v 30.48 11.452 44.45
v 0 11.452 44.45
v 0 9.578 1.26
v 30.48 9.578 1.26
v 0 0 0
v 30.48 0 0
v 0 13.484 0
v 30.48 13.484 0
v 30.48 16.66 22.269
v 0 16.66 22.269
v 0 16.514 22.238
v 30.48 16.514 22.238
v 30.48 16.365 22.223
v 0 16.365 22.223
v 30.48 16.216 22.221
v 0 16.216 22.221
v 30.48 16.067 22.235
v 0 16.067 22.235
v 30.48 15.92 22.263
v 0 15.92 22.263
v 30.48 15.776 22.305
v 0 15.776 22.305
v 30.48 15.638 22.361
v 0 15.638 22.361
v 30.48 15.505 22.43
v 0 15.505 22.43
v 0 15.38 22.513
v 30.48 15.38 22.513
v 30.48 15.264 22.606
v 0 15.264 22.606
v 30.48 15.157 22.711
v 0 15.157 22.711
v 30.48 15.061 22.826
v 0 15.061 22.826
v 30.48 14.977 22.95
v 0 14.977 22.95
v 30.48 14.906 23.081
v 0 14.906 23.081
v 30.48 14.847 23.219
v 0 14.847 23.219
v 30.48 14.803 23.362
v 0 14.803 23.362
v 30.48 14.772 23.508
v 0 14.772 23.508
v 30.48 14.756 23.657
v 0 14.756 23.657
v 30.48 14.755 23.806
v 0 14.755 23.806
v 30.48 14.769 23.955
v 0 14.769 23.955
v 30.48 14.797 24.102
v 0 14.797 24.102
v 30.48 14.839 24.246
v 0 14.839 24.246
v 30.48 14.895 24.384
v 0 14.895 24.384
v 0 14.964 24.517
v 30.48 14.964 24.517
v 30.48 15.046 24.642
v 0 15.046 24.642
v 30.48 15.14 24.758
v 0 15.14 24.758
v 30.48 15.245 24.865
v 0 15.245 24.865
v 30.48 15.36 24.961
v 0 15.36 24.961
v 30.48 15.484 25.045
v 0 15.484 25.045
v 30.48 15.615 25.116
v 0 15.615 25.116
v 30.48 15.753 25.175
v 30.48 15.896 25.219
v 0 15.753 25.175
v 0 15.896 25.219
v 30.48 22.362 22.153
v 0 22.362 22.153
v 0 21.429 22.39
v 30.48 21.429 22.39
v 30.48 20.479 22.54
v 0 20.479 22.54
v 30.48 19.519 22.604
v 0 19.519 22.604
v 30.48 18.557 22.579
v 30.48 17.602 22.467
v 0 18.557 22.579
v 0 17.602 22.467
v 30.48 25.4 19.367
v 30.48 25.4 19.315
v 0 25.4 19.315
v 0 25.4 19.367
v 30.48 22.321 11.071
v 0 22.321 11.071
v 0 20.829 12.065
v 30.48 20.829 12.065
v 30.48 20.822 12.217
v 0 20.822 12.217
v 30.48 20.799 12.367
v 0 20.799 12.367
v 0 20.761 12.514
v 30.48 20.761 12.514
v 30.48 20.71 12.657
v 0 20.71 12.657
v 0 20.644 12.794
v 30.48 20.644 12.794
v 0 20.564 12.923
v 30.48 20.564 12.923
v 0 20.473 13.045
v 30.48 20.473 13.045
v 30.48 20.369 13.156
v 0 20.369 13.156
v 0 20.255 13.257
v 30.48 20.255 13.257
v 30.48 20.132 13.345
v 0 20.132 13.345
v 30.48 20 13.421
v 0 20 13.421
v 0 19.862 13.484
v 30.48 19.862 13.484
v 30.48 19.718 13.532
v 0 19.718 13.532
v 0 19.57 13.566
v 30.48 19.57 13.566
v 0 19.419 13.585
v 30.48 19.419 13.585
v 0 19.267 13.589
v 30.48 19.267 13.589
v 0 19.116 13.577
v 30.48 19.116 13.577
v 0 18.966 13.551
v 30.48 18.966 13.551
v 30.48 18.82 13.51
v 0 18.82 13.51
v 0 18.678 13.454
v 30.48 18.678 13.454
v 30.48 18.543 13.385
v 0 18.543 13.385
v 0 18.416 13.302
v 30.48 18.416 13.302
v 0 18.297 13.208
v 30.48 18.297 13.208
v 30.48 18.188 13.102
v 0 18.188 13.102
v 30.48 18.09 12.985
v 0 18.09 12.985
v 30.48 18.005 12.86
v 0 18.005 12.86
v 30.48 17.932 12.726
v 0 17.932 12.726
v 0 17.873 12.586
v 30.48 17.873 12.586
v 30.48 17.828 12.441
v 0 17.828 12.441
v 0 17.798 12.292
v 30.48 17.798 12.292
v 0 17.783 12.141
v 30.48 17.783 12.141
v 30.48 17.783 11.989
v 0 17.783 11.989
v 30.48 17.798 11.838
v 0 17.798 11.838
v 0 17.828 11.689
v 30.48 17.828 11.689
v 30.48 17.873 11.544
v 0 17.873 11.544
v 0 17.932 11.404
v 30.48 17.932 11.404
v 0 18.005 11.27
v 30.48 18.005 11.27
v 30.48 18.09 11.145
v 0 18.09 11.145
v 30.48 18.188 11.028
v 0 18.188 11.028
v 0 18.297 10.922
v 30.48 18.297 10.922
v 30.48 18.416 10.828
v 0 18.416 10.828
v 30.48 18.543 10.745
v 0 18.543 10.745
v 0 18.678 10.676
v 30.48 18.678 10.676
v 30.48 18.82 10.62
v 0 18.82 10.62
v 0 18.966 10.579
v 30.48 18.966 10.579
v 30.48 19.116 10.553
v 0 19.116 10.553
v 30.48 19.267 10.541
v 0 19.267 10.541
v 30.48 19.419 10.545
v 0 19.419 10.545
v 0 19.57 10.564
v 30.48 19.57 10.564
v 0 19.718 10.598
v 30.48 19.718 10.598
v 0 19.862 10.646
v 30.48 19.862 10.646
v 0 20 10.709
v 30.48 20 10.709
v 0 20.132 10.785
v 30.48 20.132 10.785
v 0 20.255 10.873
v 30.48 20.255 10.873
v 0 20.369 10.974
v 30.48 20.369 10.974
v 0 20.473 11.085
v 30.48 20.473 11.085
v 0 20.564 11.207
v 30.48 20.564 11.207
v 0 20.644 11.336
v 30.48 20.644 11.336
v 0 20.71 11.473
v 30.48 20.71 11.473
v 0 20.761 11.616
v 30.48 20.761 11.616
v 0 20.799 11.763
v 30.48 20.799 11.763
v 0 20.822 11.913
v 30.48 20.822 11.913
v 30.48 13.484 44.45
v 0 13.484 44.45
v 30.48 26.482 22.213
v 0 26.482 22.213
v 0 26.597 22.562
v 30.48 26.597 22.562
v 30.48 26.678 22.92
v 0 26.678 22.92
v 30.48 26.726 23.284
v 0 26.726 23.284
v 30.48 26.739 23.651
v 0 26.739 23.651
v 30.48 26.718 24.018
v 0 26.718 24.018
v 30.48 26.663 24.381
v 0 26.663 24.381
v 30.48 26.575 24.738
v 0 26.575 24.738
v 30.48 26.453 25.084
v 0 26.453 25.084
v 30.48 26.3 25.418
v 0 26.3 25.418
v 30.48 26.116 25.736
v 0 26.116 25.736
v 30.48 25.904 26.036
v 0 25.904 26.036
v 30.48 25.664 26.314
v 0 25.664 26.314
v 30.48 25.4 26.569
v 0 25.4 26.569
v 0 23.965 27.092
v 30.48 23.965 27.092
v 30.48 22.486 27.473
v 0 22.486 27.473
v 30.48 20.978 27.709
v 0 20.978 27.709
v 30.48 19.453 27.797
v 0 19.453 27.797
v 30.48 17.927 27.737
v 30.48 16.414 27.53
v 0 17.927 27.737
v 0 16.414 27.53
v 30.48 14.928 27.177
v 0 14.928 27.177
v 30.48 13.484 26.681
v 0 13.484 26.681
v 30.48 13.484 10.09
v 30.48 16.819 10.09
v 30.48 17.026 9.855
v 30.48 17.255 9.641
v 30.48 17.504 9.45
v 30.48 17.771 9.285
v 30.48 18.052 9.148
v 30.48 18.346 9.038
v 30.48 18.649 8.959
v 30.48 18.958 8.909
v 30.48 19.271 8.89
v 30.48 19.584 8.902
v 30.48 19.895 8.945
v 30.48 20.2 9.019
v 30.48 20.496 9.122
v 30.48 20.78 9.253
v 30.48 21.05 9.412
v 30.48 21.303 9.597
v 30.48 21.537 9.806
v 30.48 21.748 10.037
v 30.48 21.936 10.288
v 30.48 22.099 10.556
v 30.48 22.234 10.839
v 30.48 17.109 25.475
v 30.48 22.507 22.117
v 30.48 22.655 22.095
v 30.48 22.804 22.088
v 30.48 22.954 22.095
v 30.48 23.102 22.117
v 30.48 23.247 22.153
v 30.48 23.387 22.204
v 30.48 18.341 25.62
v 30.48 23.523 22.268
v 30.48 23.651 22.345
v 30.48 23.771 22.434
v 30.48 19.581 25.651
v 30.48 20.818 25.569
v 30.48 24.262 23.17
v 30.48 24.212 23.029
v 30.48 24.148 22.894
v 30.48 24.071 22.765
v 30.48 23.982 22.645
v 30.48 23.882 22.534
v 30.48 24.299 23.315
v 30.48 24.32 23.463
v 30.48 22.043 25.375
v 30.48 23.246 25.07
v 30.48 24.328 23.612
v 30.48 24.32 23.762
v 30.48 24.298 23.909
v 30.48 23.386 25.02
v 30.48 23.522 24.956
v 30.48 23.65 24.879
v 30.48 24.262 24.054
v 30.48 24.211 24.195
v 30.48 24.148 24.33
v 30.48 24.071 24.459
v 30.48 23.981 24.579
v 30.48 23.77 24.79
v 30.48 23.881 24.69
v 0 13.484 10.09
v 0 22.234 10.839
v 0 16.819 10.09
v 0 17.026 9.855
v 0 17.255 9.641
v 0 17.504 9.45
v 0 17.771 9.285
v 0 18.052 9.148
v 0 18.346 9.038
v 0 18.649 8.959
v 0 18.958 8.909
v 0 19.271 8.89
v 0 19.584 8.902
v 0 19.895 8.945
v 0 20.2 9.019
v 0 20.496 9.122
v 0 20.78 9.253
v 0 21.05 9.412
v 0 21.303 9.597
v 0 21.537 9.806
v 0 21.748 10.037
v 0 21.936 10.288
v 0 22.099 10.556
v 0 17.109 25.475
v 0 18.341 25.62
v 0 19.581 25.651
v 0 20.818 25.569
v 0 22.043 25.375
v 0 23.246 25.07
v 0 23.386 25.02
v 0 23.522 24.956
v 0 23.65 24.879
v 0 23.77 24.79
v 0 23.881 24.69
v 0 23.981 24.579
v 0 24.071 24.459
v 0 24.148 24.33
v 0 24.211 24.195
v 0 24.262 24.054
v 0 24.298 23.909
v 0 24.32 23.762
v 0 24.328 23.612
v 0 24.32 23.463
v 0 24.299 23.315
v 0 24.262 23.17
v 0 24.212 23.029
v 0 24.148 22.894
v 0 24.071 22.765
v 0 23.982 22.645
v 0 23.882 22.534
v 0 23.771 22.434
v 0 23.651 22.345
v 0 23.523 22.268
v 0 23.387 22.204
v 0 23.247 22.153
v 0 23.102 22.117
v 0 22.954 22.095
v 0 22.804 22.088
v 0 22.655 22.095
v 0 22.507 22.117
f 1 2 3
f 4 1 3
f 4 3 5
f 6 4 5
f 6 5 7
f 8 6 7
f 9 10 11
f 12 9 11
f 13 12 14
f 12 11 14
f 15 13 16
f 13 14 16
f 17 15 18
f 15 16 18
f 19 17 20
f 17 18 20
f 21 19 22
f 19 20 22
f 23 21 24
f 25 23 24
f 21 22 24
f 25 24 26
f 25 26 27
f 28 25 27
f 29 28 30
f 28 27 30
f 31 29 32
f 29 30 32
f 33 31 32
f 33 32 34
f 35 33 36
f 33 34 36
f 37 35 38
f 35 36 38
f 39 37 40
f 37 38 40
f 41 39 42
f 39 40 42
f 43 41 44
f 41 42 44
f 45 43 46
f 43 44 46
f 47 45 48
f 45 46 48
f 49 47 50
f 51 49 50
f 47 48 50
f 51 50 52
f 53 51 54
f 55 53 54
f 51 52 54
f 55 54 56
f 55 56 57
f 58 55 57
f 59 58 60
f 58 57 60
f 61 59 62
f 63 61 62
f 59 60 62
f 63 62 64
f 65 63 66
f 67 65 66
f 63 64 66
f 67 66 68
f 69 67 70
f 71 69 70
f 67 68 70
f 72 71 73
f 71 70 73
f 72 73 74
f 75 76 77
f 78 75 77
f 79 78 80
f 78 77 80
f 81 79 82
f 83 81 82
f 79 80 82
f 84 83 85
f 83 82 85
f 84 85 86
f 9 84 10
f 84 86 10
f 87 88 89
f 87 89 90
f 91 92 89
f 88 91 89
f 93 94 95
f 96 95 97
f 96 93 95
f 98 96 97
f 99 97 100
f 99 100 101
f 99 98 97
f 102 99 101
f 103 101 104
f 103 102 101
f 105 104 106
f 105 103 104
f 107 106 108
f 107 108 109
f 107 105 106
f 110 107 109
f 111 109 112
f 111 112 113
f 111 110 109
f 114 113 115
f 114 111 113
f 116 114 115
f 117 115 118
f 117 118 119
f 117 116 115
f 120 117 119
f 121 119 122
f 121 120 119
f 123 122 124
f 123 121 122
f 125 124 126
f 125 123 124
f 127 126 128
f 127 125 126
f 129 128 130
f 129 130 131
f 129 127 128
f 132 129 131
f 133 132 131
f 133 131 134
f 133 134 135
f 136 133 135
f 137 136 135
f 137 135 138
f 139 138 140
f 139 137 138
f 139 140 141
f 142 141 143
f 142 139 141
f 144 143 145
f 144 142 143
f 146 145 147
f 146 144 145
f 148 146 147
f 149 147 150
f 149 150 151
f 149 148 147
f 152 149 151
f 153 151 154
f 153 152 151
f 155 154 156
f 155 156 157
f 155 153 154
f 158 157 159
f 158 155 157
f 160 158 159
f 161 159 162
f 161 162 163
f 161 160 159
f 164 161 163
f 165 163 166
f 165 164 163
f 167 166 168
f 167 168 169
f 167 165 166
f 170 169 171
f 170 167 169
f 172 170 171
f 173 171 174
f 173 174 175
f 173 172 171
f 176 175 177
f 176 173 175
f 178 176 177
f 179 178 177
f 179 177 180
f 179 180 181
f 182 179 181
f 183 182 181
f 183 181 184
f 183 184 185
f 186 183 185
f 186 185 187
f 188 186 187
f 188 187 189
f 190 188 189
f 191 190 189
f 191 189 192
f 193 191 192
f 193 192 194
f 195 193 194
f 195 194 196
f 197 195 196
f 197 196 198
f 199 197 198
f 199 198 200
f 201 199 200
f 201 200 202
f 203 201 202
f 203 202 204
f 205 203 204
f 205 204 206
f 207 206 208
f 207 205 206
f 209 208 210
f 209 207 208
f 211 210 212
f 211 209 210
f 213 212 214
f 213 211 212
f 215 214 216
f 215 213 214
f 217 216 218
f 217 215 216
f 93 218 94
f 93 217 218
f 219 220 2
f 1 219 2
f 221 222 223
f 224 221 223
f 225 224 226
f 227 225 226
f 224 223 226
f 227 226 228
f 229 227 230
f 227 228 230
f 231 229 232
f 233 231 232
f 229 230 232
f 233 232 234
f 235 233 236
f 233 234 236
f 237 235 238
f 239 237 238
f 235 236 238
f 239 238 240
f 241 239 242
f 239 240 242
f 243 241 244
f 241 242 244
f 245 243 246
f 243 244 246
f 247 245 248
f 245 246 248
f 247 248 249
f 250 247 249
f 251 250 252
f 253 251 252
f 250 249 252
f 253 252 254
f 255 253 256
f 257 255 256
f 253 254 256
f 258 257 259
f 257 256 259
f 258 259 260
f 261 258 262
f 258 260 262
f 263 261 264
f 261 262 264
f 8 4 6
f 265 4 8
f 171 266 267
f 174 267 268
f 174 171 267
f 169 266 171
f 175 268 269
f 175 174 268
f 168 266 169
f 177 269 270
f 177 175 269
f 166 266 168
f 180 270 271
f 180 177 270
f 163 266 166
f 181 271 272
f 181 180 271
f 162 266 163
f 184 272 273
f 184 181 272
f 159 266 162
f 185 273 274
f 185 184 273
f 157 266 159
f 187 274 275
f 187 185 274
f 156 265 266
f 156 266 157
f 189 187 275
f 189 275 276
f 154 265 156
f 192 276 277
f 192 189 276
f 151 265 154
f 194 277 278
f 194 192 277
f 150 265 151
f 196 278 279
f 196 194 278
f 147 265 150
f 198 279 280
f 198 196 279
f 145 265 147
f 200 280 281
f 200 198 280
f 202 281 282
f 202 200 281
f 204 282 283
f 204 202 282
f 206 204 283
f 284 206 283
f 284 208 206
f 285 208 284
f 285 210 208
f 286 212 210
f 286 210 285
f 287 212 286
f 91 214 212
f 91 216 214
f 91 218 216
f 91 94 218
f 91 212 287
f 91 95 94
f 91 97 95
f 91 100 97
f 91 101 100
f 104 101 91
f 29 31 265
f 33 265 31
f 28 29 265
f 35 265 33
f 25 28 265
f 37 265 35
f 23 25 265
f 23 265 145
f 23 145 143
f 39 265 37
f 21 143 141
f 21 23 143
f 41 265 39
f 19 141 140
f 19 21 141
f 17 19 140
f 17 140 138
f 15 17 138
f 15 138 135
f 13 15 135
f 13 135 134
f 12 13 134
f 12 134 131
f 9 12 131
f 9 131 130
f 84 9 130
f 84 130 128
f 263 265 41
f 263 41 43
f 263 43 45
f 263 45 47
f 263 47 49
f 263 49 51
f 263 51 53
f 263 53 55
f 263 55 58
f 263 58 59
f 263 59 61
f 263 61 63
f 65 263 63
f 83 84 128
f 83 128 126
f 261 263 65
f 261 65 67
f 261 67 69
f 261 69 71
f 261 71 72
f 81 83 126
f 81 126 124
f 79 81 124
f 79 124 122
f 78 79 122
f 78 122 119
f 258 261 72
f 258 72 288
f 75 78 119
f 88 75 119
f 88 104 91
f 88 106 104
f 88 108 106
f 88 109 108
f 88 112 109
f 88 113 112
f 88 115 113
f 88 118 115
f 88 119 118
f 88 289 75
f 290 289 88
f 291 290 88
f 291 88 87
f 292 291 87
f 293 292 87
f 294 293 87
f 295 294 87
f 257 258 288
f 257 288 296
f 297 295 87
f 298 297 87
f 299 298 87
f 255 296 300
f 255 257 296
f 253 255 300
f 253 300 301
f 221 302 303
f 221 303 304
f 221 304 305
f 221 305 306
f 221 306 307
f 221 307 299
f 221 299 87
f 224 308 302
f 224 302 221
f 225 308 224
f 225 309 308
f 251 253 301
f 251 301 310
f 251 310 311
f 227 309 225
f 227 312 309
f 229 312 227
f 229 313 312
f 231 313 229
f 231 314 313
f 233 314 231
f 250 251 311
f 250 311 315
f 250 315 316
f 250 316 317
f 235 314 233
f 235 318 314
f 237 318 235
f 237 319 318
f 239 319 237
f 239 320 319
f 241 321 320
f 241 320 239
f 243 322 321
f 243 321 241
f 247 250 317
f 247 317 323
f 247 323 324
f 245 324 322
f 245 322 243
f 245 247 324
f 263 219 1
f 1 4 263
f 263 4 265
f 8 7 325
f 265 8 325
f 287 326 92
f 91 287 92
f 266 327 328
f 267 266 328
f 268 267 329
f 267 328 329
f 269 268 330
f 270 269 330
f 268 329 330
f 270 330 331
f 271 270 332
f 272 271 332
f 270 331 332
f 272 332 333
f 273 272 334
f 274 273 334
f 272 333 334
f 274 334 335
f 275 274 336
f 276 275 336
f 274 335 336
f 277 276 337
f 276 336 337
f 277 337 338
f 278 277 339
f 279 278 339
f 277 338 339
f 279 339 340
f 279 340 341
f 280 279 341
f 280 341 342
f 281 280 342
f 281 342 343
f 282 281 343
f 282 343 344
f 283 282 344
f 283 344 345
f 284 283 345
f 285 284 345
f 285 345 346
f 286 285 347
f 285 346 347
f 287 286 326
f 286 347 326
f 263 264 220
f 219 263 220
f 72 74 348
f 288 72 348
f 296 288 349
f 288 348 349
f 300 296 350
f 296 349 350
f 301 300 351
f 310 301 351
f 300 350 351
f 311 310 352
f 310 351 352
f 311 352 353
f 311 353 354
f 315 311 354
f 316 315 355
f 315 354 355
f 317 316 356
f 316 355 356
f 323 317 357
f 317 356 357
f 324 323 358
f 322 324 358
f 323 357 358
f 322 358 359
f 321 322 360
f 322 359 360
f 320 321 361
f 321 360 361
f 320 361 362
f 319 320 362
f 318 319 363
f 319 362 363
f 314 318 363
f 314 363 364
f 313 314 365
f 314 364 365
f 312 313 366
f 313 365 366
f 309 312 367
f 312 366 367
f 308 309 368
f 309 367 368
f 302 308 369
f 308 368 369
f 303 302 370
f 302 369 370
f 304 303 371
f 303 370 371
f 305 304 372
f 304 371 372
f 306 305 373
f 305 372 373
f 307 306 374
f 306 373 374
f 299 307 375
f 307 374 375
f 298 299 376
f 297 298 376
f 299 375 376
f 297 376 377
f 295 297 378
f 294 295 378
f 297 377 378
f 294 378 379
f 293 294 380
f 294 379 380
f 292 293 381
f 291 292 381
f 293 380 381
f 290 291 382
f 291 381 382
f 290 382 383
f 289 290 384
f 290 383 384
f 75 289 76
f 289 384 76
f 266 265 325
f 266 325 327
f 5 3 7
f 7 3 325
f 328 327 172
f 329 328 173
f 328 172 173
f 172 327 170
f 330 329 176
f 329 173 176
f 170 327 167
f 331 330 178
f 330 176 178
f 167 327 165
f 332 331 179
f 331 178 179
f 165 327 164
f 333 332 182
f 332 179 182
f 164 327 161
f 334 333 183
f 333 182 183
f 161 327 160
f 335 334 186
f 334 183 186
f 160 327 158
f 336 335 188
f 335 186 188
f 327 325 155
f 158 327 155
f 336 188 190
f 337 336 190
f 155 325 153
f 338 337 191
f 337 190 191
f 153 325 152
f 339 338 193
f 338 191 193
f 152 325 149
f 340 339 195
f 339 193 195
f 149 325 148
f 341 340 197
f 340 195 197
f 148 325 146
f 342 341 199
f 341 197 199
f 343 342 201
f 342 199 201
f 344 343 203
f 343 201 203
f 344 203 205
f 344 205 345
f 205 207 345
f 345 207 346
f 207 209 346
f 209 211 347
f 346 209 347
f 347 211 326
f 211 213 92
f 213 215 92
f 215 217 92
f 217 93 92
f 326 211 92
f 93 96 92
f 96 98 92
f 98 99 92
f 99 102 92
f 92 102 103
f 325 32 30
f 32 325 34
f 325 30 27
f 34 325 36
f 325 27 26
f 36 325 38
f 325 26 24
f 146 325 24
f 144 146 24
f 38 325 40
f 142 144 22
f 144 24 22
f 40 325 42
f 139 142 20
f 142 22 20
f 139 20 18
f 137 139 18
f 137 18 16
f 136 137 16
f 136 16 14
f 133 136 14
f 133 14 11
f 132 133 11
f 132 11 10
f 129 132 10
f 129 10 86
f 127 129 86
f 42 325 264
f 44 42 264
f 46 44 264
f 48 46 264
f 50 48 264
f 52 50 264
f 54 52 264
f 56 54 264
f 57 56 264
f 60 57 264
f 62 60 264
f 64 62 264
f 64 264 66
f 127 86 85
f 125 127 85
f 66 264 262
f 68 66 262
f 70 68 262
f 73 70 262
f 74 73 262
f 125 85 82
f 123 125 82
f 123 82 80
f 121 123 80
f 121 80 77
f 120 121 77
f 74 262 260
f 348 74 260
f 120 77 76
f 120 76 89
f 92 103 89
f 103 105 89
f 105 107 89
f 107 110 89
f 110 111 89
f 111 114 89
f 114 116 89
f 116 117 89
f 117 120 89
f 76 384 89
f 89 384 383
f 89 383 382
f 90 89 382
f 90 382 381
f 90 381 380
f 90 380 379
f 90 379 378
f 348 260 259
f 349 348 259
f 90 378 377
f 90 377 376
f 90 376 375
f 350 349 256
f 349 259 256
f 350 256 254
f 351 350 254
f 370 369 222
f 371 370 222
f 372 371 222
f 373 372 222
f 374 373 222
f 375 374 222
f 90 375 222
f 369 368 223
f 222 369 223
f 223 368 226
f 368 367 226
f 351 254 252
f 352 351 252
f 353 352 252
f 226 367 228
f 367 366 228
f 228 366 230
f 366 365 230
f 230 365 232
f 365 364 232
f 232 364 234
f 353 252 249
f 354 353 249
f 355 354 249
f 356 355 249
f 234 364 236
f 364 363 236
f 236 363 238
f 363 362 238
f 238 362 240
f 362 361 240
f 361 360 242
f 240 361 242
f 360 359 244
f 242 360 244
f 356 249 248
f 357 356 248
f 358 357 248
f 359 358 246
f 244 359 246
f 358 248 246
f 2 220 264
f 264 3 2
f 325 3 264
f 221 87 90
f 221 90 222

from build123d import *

# Parameters (mm, degrees)
F0_R     = 1.524
F1_DEPTH = 30.48


with BuildPart() as f1:
    # F0 (on Right) → F1 (new body)
    with BuildSketch(Plane.YZ):
        with BuildLine():
            Line((9.577657, 1.260484), (0, 0))
            Line((0, 0), (13.483933, 0))
            Line((13.483933, 0), (13.483933, 10.089966))
            Line((13.483933, 10.089966), (16.819245, 10.089966))
            ThreePointArc((16.819245, 10.089966), (19.740182, 8.919941), (22.233874, 10.83888))
            Line((22.233874, 10.83888), (22.320532, 11.070883))
            Line((22.320532, 11.070883), (25.4, 19.315274))
            Line((25.4, 19.315274), (25.4, 19.366832))
            Line((25.4, 19.366832), (26.482258, 22.212708))
            ThreePointArc((26.482258, 22.212708), (26.623188, 24.560453), (25.4, 26.569328))
            ThreePointArc((25.4, 26.569328), (19.452975, 27.79715), (13.483933, 26.681274))
            Line((13.483933, 26.681274), (13.483933, 44.45))
            Line((13.483933, 44.45), (12.7, 44.45))
            Line((12.7, 44.45), (11.451933, 44.45))
            Line((11.451933, 44.45), (9.577657, 1.260484))
        make_face()
        with Locations((19.305179, 12.065)):
            Circle(F0_R, mode=Mode.SUBTRACT)
        with BuildLine():
            ThreePointArc((15.895544, 25.219289), (19.580856, 25.651203), (23.245615, 25.070149))
            ThreePointArc((23.245615, 25.070149), (24.262218, 23.169709), (22.361779, 22.153106))
            ThreePointArc((22.361779, 22.153106), (19.519022, 22.603831), (16.660322, 22.268794))
            ThreePointArc((16.660322, 22.268794), (14.802685, 23.361652), (15.895544, 25.219289))
        make_face(mode=Mode.SUBTRACT)
    extrude(amount=F1_DEPTH)


solid = f1.part
